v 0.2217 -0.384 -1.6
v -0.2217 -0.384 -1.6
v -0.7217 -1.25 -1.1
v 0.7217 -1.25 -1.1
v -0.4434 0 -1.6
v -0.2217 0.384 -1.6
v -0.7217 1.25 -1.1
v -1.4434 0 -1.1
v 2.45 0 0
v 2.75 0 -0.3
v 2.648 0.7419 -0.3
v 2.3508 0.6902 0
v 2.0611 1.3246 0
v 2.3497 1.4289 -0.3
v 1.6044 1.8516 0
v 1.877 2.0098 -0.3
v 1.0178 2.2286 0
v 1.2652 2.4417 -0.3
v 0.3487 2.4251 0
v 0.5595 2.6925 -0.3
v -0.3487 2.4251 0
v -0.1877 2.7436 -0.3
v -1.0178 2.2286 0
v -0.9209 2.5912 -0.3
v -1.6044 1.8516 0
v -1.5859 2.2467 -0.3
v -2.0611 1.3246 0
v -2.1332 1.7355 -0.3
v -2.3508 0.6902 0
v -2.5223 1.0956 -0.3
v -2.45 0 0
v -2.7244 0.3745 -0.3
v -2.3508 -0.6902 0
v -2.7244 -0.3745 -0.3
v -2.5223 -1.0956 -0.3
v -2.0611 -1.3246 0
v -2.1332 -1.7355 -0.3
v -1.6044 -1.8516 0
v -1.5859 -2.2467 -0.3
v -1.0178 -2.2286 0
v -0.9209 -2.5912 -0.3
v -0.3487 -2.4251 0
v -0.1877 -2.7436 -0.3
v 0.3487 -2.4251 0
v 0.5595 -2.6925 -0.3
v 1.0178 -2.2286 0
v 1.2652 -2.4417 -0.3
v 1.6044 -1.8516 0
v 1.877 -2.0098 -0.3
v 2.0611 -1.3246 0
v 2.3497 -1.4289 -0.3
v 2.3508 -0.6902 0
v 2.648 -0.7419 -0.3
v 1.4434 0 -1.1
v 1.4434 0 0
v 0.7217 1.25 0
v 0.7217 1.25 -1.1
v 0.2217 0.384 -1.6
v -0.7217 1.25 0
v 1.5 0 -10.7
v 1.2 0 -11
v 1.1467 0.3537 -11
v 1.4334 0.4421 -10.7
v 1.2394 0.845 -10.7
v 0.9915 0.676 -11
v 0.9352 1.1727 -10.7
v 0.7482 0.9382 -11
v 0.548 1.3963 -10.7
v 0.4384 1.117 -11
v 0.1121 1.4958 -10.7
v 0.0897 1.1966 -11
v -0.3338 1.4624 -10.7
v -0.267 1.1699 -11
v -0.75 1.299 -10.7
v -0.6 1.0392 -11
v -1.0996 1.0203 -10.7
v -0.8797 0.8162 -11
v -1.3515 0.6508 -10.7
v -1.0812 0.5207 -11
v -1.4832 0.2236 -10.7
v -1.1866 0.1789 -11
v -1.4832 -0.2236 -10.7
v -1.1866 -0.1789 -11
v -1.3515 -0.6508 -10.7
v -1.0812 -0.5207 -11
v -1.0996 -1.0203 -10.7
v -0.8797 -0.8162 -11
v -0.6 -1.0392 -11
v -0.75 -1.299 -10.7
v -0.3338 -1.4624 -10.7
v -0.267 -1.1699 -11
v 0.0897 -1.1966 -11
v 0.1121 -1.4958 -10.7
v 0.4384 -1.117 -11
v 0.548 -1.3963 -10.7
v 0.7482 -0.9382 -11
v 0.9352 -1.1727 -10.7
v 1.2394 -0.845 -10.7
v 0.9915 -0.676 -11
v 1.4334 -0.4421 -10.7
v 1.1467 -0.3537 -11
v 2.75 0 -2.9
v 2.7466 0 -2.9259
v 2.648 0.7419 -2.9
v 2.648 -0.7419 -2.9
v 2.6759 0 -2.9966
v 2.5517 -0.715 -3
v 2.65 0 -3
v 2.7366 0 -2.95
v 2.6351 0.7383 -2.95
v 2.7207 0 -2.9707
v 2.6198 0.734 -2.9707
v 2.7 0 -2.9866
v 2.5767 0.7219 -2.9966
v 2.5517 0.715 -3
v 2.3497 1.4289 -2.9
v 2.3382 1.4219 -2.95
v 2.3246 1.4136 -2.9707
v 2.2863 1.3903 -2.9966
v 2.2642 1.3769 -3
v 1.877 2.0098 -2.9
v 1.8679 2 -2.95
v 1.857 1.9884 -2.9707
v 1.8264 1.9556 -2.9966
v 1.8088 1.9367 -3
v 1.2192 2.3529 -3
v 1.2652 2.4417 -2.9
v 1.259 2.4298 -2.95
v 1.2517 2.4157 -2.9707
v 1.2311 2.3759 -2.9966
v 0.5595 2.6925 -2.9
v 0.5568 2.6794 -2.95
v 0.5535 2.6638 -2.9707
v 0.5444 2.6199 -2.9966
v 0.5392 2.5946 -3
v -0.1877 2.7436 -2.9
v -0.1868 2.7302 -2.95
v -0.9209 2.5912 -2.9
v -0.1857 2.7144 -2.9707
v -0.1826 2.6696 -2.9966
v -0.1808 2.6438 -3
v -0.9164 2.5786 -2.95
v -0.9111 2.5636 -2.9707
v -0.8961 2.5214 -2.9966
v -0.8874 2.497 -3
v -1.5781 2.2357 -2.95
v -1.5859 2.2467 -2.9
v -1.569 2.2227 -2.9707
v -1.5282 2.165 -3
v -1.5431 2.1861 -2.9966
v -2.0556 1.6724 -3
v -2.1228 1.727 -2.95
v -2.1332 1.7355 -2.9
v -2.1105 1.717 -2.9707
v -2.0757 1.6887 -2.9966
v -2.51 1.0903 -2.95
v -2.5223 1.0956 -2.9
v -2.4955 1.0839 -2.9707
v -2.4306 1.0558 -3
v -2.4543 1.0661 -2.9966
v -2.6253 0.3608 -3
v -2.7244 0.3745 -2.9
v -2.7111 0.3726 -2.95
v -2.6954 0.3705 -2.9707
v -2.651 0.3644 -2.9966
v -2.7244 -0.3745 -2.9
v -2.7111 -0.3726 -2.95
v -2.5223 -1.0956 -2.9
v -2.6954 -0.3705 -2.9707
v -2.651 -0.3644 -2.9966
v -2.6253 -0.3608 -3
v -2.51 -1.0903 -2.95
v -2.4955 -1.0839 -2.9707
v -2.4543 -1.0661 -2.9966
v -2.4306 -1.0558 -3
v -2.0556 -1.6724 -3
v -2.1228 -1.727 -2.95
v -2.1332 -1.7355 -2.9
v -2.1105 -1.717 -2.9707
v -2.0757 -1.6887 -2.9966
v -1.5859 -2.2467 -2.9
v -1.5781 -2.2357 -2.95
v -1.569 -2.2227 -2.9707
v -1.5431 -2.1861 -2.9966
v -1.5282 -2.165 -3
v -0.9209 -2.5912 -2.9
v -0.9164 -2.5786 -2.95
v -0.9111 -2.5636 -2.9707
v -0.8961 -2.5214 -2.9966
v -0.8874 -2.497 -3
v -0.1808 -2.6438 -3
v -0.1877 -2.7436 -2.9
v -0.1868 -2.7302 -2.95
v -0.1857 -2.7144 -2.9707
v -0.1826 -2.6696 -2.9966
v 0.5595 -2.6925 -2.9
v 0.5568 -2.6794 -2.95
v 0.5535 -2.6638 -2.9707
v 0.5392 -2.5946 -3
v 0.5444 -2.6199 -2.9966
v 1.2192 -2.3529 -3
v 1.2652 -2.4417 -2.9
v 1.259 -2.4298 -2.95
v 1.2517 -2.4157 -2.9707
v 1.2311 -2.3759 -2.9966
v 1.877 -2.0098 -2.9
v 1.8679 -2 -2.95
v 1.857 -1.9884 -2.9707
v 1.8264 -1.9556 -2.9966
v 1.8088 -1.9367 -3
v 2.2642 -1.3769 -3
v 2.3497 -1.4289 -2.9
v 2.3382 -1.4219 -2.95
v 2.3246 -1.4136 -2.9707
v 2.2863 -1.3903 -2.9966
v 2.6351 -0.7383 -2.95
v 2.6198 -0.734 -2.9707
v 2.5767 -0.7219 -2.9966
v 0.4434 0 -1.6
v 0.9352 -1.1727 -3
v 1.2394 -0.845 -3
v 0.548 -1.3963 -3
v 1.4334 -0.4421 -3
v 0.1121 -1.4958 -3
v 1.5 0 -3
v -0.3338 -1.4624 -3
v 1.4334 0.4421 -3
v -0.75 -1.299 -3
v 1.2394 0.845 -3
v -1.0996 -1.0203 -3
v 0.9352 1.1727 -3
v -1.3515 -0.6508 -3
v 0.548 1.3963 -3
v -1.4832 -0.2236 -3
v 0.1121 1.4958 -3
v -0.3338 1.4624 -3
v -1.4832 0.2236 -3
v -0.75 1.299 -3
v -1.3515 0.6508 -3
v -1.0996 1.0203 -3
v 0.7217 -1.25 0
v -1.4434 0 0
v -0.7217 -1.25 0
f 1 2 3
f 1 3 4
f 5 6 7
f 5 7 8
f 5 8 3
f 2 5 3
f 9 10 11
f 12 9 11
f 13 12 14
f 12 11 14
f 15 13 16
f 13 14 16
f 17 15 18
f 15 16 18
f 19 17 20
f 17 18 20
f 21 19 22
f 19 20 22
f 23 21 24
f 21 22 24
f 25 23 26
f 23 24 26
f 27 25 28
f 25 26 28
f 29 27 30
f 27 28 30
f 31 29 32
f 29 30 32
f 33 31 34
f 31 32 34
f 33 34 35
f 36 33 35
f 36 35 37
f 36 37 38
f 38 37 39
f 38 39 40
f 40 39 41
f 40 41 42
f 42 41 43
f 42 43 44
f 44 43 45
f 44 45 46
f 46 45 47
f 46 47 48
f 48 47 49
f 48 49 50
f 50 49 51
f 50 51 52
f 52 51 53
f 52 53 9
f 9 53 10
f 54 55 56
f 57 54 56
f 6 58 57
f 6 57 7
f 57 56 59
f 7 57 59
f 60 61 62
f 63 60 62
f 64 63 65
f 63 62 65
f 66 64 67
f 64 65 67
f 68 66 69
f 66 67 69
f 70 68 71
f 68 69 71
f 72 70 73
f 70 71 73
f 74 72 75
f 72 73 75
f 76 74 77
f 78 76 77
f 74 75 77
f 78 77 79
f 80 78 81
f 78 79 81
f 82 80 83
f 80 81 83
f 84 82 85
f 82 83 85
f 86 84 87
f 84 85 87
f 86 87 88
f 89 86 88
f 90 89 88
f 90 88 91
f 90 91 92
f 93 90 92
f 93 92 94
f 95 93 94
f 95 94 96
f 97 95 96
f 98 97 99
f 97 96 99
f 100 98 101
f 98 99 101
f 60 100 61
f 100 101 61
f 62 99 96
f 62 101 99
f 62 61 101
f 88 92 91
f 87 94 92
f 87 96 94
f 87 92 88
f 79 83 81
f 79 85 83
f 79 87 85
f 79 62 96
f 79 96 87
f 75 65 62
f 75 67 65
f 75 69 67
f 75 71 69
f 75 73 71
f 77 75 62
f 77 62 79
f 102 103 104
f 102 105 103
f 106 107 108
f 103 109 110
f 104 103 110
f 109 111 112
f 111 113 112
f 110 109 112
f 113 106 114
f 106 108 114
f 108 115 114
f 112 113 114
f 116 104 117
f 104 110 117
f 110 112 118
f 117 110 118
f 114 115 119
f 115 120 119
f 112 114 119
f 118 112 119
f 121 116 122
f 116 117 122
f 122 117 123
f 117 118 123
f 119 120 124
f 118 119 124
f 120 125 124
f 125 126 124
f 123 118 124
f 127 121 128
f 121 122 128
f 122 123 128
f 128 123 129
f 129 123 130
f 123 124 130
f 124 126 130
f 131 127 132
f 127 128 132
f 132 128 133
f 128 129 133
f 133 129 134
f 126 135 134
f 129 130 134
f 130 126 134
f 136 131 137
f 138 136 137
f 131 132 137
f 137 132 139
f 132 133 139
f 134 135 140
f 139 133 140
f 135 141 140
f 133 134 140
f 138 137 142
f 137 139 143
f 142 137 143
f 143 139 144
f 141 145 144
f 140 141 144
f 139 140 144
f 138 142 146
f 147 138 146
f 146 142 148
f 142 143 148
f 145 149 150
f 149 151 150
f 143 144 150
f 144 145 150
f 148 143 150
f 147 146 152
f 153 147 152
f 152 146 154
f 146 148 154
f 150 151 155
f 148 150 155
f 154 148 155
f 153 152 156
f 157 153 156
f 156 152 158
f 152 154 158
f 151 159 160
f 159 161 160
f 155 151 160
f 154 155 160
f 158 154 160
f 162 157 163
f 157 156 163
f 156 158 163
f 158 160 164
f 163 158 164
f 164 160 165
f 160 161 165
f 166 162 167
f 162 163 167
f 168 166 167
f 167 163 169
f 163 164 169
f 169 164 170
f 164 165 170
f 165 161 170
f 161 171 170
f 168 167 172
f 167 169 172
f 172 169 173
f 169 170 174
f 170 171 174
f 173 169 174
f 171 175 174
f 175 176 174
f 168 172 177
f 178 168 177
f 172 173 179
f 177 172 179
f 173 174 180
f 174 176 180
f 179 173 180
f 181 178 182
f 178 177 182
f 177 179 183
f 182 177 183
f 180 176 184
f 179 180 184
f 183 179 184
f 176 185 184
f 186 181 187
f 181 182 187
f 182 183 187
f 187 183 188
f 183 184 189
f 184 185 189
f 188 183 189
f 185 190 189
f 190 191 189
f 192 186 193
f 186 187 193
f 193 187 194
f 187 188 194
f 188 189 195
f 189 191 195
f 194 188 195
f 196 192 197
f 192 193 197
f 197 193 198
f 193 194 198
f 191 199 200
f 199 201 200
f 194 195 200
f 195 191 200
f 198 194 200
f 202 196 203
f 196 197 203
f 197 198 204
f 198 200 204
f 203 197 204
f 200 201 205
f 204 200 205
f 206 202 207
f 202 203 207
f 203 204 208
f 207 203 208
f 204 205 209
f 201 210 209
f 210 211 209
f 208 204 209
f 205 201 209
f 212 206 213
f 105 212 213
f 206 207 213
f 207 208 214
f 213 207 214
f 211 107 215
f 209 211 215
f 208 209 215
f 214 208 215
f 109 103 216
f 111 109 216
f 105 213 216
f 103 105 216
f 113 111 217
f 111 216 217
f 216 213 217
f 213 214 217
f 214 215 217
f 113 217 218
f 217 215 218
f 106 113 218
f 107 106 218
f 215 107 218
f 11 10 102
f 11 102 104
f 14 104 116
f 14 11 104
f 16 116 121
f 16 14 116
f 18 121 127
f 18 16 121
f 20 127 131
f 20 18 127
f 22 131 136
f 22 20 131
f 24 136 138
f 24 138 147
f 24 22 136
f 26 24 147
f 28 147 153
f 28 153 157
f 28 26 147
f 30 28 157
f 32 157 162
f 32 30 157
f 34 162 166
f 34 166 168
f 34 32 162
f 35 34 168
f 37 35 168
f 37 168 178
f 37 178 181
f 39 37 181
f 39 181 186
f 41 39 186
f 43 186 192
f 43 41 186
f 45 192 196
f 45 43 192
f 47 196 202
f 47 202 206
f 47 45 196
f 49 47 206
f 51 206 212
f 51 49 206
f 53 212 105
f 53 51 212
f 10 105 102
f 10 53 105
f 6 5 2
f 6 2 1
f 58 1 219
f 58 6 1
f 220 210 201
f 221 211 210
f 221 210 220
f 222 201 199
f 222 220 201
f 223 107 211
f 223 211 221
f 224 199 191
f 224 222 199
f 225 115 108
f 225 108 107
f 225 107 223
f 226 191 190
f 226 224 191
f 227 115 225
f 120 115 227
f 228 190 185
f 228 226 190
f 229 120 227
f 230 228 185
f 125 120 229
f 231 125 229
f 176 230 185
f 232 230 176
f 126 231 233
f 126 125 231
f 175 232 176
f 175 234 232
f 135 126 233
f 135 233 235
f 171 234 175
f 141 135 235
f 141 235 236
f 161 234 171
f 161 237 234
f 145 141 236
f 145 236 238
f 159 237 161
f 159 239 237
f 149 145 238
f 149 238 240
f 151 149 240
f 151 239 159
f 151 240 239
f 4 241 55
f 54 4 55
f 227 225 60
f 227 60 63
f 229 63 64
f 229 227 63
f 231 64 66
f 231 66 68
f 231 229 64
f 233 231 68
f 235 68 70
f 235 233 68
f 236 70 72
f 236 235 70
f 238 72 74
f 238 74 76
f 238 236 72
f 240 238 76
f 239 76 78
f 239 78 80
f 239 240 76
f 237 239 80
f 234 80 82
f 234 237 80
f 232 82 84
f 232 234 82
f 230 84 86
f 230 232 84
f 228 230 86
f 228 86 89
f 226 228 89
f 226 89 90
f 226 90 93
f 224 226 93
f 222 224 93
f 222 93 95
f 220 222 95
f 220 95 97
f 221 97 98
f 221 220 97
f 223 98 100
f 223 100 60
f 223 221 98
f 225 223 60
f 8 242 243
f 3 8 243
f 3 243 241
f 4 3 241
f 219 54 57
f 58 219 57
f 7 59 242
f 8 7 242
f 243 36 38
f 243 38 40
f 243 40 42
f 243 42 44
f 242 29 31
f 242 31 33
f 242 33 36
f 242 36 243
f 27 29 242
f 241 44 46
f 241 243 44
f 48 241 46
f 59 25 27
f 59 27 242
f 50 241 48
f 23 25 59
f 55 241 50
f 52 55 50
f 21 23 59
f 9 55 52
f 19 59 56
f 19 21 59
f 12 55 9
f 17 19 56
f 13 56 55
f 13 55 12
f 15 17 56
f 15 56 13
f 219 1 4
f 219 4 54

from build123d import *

# Parameters (mm, degrees)
F3_DEPTH = 1.6
F4_SIZE2 = 0.8660254038
F4_SIZE  = 0.5
F5_SIZE  = 0.3
F6_R     = 0.1


with BuildPart() as f1:
    # F0 (on Front) → F1 (revolve)
    with BuildSketch(Plane.XZ):
        Polygon((2.75, 0), (0, 0), (0, -11), (1.5, -11), (1.5, -3), (2.75, -3), align=None)
    revolve(axis=Axis((0, 0, -5.5), (0, 0, 1)))

    # F2 (on face) → F3 (cut)
    with BuildSketch(Plane.XY):
        Polygon((0.7216878365, 1.25), (-0.7216878365, 1.25), (-1.443375673, 0), (-0.7216878365, -1.25), (0.7216878365, -1.25), (1.443375673, 0), align=None)
    extrude(amount=-F3_DEPTH, mode=Mode.SUBTRACT)

    # F4
    f4_edges = [f1.edges().sort_by_distance(p)[0] for p in [
        (0, 1.25, -1.6),
        (-1.082532, 0.625, -1.6),
        (-1.082532, -0.625, -1.6),
        (0, -1.25, -1.6),
        (1.082532, -0.625, -1.6),
        (1.082532, 0.625, -1.6),
    ]]
    chamfer(f4_edges, length=F4_SIZE, length2=F4_SIZE2)

    # F5
    f5_edges = [f1.edges().sort_by_distance(p)[0] for p in [
        (-2.75, 0, 0),
        (-1.5, 0, -11),
    ]]
    chamfer(f5_edges, length=F5_SIZE)

    # F6
    f6_edges = [f1.edges().sort_by_distance(p)[0] for p in [
        (-2.75, 0, -3),
    ]]
    fillet(f6_edges, radius=F6_R)


with BuildPart() as f7_1:
    # F7: copy of F1
    add(f1.part)


solid = f1.part
